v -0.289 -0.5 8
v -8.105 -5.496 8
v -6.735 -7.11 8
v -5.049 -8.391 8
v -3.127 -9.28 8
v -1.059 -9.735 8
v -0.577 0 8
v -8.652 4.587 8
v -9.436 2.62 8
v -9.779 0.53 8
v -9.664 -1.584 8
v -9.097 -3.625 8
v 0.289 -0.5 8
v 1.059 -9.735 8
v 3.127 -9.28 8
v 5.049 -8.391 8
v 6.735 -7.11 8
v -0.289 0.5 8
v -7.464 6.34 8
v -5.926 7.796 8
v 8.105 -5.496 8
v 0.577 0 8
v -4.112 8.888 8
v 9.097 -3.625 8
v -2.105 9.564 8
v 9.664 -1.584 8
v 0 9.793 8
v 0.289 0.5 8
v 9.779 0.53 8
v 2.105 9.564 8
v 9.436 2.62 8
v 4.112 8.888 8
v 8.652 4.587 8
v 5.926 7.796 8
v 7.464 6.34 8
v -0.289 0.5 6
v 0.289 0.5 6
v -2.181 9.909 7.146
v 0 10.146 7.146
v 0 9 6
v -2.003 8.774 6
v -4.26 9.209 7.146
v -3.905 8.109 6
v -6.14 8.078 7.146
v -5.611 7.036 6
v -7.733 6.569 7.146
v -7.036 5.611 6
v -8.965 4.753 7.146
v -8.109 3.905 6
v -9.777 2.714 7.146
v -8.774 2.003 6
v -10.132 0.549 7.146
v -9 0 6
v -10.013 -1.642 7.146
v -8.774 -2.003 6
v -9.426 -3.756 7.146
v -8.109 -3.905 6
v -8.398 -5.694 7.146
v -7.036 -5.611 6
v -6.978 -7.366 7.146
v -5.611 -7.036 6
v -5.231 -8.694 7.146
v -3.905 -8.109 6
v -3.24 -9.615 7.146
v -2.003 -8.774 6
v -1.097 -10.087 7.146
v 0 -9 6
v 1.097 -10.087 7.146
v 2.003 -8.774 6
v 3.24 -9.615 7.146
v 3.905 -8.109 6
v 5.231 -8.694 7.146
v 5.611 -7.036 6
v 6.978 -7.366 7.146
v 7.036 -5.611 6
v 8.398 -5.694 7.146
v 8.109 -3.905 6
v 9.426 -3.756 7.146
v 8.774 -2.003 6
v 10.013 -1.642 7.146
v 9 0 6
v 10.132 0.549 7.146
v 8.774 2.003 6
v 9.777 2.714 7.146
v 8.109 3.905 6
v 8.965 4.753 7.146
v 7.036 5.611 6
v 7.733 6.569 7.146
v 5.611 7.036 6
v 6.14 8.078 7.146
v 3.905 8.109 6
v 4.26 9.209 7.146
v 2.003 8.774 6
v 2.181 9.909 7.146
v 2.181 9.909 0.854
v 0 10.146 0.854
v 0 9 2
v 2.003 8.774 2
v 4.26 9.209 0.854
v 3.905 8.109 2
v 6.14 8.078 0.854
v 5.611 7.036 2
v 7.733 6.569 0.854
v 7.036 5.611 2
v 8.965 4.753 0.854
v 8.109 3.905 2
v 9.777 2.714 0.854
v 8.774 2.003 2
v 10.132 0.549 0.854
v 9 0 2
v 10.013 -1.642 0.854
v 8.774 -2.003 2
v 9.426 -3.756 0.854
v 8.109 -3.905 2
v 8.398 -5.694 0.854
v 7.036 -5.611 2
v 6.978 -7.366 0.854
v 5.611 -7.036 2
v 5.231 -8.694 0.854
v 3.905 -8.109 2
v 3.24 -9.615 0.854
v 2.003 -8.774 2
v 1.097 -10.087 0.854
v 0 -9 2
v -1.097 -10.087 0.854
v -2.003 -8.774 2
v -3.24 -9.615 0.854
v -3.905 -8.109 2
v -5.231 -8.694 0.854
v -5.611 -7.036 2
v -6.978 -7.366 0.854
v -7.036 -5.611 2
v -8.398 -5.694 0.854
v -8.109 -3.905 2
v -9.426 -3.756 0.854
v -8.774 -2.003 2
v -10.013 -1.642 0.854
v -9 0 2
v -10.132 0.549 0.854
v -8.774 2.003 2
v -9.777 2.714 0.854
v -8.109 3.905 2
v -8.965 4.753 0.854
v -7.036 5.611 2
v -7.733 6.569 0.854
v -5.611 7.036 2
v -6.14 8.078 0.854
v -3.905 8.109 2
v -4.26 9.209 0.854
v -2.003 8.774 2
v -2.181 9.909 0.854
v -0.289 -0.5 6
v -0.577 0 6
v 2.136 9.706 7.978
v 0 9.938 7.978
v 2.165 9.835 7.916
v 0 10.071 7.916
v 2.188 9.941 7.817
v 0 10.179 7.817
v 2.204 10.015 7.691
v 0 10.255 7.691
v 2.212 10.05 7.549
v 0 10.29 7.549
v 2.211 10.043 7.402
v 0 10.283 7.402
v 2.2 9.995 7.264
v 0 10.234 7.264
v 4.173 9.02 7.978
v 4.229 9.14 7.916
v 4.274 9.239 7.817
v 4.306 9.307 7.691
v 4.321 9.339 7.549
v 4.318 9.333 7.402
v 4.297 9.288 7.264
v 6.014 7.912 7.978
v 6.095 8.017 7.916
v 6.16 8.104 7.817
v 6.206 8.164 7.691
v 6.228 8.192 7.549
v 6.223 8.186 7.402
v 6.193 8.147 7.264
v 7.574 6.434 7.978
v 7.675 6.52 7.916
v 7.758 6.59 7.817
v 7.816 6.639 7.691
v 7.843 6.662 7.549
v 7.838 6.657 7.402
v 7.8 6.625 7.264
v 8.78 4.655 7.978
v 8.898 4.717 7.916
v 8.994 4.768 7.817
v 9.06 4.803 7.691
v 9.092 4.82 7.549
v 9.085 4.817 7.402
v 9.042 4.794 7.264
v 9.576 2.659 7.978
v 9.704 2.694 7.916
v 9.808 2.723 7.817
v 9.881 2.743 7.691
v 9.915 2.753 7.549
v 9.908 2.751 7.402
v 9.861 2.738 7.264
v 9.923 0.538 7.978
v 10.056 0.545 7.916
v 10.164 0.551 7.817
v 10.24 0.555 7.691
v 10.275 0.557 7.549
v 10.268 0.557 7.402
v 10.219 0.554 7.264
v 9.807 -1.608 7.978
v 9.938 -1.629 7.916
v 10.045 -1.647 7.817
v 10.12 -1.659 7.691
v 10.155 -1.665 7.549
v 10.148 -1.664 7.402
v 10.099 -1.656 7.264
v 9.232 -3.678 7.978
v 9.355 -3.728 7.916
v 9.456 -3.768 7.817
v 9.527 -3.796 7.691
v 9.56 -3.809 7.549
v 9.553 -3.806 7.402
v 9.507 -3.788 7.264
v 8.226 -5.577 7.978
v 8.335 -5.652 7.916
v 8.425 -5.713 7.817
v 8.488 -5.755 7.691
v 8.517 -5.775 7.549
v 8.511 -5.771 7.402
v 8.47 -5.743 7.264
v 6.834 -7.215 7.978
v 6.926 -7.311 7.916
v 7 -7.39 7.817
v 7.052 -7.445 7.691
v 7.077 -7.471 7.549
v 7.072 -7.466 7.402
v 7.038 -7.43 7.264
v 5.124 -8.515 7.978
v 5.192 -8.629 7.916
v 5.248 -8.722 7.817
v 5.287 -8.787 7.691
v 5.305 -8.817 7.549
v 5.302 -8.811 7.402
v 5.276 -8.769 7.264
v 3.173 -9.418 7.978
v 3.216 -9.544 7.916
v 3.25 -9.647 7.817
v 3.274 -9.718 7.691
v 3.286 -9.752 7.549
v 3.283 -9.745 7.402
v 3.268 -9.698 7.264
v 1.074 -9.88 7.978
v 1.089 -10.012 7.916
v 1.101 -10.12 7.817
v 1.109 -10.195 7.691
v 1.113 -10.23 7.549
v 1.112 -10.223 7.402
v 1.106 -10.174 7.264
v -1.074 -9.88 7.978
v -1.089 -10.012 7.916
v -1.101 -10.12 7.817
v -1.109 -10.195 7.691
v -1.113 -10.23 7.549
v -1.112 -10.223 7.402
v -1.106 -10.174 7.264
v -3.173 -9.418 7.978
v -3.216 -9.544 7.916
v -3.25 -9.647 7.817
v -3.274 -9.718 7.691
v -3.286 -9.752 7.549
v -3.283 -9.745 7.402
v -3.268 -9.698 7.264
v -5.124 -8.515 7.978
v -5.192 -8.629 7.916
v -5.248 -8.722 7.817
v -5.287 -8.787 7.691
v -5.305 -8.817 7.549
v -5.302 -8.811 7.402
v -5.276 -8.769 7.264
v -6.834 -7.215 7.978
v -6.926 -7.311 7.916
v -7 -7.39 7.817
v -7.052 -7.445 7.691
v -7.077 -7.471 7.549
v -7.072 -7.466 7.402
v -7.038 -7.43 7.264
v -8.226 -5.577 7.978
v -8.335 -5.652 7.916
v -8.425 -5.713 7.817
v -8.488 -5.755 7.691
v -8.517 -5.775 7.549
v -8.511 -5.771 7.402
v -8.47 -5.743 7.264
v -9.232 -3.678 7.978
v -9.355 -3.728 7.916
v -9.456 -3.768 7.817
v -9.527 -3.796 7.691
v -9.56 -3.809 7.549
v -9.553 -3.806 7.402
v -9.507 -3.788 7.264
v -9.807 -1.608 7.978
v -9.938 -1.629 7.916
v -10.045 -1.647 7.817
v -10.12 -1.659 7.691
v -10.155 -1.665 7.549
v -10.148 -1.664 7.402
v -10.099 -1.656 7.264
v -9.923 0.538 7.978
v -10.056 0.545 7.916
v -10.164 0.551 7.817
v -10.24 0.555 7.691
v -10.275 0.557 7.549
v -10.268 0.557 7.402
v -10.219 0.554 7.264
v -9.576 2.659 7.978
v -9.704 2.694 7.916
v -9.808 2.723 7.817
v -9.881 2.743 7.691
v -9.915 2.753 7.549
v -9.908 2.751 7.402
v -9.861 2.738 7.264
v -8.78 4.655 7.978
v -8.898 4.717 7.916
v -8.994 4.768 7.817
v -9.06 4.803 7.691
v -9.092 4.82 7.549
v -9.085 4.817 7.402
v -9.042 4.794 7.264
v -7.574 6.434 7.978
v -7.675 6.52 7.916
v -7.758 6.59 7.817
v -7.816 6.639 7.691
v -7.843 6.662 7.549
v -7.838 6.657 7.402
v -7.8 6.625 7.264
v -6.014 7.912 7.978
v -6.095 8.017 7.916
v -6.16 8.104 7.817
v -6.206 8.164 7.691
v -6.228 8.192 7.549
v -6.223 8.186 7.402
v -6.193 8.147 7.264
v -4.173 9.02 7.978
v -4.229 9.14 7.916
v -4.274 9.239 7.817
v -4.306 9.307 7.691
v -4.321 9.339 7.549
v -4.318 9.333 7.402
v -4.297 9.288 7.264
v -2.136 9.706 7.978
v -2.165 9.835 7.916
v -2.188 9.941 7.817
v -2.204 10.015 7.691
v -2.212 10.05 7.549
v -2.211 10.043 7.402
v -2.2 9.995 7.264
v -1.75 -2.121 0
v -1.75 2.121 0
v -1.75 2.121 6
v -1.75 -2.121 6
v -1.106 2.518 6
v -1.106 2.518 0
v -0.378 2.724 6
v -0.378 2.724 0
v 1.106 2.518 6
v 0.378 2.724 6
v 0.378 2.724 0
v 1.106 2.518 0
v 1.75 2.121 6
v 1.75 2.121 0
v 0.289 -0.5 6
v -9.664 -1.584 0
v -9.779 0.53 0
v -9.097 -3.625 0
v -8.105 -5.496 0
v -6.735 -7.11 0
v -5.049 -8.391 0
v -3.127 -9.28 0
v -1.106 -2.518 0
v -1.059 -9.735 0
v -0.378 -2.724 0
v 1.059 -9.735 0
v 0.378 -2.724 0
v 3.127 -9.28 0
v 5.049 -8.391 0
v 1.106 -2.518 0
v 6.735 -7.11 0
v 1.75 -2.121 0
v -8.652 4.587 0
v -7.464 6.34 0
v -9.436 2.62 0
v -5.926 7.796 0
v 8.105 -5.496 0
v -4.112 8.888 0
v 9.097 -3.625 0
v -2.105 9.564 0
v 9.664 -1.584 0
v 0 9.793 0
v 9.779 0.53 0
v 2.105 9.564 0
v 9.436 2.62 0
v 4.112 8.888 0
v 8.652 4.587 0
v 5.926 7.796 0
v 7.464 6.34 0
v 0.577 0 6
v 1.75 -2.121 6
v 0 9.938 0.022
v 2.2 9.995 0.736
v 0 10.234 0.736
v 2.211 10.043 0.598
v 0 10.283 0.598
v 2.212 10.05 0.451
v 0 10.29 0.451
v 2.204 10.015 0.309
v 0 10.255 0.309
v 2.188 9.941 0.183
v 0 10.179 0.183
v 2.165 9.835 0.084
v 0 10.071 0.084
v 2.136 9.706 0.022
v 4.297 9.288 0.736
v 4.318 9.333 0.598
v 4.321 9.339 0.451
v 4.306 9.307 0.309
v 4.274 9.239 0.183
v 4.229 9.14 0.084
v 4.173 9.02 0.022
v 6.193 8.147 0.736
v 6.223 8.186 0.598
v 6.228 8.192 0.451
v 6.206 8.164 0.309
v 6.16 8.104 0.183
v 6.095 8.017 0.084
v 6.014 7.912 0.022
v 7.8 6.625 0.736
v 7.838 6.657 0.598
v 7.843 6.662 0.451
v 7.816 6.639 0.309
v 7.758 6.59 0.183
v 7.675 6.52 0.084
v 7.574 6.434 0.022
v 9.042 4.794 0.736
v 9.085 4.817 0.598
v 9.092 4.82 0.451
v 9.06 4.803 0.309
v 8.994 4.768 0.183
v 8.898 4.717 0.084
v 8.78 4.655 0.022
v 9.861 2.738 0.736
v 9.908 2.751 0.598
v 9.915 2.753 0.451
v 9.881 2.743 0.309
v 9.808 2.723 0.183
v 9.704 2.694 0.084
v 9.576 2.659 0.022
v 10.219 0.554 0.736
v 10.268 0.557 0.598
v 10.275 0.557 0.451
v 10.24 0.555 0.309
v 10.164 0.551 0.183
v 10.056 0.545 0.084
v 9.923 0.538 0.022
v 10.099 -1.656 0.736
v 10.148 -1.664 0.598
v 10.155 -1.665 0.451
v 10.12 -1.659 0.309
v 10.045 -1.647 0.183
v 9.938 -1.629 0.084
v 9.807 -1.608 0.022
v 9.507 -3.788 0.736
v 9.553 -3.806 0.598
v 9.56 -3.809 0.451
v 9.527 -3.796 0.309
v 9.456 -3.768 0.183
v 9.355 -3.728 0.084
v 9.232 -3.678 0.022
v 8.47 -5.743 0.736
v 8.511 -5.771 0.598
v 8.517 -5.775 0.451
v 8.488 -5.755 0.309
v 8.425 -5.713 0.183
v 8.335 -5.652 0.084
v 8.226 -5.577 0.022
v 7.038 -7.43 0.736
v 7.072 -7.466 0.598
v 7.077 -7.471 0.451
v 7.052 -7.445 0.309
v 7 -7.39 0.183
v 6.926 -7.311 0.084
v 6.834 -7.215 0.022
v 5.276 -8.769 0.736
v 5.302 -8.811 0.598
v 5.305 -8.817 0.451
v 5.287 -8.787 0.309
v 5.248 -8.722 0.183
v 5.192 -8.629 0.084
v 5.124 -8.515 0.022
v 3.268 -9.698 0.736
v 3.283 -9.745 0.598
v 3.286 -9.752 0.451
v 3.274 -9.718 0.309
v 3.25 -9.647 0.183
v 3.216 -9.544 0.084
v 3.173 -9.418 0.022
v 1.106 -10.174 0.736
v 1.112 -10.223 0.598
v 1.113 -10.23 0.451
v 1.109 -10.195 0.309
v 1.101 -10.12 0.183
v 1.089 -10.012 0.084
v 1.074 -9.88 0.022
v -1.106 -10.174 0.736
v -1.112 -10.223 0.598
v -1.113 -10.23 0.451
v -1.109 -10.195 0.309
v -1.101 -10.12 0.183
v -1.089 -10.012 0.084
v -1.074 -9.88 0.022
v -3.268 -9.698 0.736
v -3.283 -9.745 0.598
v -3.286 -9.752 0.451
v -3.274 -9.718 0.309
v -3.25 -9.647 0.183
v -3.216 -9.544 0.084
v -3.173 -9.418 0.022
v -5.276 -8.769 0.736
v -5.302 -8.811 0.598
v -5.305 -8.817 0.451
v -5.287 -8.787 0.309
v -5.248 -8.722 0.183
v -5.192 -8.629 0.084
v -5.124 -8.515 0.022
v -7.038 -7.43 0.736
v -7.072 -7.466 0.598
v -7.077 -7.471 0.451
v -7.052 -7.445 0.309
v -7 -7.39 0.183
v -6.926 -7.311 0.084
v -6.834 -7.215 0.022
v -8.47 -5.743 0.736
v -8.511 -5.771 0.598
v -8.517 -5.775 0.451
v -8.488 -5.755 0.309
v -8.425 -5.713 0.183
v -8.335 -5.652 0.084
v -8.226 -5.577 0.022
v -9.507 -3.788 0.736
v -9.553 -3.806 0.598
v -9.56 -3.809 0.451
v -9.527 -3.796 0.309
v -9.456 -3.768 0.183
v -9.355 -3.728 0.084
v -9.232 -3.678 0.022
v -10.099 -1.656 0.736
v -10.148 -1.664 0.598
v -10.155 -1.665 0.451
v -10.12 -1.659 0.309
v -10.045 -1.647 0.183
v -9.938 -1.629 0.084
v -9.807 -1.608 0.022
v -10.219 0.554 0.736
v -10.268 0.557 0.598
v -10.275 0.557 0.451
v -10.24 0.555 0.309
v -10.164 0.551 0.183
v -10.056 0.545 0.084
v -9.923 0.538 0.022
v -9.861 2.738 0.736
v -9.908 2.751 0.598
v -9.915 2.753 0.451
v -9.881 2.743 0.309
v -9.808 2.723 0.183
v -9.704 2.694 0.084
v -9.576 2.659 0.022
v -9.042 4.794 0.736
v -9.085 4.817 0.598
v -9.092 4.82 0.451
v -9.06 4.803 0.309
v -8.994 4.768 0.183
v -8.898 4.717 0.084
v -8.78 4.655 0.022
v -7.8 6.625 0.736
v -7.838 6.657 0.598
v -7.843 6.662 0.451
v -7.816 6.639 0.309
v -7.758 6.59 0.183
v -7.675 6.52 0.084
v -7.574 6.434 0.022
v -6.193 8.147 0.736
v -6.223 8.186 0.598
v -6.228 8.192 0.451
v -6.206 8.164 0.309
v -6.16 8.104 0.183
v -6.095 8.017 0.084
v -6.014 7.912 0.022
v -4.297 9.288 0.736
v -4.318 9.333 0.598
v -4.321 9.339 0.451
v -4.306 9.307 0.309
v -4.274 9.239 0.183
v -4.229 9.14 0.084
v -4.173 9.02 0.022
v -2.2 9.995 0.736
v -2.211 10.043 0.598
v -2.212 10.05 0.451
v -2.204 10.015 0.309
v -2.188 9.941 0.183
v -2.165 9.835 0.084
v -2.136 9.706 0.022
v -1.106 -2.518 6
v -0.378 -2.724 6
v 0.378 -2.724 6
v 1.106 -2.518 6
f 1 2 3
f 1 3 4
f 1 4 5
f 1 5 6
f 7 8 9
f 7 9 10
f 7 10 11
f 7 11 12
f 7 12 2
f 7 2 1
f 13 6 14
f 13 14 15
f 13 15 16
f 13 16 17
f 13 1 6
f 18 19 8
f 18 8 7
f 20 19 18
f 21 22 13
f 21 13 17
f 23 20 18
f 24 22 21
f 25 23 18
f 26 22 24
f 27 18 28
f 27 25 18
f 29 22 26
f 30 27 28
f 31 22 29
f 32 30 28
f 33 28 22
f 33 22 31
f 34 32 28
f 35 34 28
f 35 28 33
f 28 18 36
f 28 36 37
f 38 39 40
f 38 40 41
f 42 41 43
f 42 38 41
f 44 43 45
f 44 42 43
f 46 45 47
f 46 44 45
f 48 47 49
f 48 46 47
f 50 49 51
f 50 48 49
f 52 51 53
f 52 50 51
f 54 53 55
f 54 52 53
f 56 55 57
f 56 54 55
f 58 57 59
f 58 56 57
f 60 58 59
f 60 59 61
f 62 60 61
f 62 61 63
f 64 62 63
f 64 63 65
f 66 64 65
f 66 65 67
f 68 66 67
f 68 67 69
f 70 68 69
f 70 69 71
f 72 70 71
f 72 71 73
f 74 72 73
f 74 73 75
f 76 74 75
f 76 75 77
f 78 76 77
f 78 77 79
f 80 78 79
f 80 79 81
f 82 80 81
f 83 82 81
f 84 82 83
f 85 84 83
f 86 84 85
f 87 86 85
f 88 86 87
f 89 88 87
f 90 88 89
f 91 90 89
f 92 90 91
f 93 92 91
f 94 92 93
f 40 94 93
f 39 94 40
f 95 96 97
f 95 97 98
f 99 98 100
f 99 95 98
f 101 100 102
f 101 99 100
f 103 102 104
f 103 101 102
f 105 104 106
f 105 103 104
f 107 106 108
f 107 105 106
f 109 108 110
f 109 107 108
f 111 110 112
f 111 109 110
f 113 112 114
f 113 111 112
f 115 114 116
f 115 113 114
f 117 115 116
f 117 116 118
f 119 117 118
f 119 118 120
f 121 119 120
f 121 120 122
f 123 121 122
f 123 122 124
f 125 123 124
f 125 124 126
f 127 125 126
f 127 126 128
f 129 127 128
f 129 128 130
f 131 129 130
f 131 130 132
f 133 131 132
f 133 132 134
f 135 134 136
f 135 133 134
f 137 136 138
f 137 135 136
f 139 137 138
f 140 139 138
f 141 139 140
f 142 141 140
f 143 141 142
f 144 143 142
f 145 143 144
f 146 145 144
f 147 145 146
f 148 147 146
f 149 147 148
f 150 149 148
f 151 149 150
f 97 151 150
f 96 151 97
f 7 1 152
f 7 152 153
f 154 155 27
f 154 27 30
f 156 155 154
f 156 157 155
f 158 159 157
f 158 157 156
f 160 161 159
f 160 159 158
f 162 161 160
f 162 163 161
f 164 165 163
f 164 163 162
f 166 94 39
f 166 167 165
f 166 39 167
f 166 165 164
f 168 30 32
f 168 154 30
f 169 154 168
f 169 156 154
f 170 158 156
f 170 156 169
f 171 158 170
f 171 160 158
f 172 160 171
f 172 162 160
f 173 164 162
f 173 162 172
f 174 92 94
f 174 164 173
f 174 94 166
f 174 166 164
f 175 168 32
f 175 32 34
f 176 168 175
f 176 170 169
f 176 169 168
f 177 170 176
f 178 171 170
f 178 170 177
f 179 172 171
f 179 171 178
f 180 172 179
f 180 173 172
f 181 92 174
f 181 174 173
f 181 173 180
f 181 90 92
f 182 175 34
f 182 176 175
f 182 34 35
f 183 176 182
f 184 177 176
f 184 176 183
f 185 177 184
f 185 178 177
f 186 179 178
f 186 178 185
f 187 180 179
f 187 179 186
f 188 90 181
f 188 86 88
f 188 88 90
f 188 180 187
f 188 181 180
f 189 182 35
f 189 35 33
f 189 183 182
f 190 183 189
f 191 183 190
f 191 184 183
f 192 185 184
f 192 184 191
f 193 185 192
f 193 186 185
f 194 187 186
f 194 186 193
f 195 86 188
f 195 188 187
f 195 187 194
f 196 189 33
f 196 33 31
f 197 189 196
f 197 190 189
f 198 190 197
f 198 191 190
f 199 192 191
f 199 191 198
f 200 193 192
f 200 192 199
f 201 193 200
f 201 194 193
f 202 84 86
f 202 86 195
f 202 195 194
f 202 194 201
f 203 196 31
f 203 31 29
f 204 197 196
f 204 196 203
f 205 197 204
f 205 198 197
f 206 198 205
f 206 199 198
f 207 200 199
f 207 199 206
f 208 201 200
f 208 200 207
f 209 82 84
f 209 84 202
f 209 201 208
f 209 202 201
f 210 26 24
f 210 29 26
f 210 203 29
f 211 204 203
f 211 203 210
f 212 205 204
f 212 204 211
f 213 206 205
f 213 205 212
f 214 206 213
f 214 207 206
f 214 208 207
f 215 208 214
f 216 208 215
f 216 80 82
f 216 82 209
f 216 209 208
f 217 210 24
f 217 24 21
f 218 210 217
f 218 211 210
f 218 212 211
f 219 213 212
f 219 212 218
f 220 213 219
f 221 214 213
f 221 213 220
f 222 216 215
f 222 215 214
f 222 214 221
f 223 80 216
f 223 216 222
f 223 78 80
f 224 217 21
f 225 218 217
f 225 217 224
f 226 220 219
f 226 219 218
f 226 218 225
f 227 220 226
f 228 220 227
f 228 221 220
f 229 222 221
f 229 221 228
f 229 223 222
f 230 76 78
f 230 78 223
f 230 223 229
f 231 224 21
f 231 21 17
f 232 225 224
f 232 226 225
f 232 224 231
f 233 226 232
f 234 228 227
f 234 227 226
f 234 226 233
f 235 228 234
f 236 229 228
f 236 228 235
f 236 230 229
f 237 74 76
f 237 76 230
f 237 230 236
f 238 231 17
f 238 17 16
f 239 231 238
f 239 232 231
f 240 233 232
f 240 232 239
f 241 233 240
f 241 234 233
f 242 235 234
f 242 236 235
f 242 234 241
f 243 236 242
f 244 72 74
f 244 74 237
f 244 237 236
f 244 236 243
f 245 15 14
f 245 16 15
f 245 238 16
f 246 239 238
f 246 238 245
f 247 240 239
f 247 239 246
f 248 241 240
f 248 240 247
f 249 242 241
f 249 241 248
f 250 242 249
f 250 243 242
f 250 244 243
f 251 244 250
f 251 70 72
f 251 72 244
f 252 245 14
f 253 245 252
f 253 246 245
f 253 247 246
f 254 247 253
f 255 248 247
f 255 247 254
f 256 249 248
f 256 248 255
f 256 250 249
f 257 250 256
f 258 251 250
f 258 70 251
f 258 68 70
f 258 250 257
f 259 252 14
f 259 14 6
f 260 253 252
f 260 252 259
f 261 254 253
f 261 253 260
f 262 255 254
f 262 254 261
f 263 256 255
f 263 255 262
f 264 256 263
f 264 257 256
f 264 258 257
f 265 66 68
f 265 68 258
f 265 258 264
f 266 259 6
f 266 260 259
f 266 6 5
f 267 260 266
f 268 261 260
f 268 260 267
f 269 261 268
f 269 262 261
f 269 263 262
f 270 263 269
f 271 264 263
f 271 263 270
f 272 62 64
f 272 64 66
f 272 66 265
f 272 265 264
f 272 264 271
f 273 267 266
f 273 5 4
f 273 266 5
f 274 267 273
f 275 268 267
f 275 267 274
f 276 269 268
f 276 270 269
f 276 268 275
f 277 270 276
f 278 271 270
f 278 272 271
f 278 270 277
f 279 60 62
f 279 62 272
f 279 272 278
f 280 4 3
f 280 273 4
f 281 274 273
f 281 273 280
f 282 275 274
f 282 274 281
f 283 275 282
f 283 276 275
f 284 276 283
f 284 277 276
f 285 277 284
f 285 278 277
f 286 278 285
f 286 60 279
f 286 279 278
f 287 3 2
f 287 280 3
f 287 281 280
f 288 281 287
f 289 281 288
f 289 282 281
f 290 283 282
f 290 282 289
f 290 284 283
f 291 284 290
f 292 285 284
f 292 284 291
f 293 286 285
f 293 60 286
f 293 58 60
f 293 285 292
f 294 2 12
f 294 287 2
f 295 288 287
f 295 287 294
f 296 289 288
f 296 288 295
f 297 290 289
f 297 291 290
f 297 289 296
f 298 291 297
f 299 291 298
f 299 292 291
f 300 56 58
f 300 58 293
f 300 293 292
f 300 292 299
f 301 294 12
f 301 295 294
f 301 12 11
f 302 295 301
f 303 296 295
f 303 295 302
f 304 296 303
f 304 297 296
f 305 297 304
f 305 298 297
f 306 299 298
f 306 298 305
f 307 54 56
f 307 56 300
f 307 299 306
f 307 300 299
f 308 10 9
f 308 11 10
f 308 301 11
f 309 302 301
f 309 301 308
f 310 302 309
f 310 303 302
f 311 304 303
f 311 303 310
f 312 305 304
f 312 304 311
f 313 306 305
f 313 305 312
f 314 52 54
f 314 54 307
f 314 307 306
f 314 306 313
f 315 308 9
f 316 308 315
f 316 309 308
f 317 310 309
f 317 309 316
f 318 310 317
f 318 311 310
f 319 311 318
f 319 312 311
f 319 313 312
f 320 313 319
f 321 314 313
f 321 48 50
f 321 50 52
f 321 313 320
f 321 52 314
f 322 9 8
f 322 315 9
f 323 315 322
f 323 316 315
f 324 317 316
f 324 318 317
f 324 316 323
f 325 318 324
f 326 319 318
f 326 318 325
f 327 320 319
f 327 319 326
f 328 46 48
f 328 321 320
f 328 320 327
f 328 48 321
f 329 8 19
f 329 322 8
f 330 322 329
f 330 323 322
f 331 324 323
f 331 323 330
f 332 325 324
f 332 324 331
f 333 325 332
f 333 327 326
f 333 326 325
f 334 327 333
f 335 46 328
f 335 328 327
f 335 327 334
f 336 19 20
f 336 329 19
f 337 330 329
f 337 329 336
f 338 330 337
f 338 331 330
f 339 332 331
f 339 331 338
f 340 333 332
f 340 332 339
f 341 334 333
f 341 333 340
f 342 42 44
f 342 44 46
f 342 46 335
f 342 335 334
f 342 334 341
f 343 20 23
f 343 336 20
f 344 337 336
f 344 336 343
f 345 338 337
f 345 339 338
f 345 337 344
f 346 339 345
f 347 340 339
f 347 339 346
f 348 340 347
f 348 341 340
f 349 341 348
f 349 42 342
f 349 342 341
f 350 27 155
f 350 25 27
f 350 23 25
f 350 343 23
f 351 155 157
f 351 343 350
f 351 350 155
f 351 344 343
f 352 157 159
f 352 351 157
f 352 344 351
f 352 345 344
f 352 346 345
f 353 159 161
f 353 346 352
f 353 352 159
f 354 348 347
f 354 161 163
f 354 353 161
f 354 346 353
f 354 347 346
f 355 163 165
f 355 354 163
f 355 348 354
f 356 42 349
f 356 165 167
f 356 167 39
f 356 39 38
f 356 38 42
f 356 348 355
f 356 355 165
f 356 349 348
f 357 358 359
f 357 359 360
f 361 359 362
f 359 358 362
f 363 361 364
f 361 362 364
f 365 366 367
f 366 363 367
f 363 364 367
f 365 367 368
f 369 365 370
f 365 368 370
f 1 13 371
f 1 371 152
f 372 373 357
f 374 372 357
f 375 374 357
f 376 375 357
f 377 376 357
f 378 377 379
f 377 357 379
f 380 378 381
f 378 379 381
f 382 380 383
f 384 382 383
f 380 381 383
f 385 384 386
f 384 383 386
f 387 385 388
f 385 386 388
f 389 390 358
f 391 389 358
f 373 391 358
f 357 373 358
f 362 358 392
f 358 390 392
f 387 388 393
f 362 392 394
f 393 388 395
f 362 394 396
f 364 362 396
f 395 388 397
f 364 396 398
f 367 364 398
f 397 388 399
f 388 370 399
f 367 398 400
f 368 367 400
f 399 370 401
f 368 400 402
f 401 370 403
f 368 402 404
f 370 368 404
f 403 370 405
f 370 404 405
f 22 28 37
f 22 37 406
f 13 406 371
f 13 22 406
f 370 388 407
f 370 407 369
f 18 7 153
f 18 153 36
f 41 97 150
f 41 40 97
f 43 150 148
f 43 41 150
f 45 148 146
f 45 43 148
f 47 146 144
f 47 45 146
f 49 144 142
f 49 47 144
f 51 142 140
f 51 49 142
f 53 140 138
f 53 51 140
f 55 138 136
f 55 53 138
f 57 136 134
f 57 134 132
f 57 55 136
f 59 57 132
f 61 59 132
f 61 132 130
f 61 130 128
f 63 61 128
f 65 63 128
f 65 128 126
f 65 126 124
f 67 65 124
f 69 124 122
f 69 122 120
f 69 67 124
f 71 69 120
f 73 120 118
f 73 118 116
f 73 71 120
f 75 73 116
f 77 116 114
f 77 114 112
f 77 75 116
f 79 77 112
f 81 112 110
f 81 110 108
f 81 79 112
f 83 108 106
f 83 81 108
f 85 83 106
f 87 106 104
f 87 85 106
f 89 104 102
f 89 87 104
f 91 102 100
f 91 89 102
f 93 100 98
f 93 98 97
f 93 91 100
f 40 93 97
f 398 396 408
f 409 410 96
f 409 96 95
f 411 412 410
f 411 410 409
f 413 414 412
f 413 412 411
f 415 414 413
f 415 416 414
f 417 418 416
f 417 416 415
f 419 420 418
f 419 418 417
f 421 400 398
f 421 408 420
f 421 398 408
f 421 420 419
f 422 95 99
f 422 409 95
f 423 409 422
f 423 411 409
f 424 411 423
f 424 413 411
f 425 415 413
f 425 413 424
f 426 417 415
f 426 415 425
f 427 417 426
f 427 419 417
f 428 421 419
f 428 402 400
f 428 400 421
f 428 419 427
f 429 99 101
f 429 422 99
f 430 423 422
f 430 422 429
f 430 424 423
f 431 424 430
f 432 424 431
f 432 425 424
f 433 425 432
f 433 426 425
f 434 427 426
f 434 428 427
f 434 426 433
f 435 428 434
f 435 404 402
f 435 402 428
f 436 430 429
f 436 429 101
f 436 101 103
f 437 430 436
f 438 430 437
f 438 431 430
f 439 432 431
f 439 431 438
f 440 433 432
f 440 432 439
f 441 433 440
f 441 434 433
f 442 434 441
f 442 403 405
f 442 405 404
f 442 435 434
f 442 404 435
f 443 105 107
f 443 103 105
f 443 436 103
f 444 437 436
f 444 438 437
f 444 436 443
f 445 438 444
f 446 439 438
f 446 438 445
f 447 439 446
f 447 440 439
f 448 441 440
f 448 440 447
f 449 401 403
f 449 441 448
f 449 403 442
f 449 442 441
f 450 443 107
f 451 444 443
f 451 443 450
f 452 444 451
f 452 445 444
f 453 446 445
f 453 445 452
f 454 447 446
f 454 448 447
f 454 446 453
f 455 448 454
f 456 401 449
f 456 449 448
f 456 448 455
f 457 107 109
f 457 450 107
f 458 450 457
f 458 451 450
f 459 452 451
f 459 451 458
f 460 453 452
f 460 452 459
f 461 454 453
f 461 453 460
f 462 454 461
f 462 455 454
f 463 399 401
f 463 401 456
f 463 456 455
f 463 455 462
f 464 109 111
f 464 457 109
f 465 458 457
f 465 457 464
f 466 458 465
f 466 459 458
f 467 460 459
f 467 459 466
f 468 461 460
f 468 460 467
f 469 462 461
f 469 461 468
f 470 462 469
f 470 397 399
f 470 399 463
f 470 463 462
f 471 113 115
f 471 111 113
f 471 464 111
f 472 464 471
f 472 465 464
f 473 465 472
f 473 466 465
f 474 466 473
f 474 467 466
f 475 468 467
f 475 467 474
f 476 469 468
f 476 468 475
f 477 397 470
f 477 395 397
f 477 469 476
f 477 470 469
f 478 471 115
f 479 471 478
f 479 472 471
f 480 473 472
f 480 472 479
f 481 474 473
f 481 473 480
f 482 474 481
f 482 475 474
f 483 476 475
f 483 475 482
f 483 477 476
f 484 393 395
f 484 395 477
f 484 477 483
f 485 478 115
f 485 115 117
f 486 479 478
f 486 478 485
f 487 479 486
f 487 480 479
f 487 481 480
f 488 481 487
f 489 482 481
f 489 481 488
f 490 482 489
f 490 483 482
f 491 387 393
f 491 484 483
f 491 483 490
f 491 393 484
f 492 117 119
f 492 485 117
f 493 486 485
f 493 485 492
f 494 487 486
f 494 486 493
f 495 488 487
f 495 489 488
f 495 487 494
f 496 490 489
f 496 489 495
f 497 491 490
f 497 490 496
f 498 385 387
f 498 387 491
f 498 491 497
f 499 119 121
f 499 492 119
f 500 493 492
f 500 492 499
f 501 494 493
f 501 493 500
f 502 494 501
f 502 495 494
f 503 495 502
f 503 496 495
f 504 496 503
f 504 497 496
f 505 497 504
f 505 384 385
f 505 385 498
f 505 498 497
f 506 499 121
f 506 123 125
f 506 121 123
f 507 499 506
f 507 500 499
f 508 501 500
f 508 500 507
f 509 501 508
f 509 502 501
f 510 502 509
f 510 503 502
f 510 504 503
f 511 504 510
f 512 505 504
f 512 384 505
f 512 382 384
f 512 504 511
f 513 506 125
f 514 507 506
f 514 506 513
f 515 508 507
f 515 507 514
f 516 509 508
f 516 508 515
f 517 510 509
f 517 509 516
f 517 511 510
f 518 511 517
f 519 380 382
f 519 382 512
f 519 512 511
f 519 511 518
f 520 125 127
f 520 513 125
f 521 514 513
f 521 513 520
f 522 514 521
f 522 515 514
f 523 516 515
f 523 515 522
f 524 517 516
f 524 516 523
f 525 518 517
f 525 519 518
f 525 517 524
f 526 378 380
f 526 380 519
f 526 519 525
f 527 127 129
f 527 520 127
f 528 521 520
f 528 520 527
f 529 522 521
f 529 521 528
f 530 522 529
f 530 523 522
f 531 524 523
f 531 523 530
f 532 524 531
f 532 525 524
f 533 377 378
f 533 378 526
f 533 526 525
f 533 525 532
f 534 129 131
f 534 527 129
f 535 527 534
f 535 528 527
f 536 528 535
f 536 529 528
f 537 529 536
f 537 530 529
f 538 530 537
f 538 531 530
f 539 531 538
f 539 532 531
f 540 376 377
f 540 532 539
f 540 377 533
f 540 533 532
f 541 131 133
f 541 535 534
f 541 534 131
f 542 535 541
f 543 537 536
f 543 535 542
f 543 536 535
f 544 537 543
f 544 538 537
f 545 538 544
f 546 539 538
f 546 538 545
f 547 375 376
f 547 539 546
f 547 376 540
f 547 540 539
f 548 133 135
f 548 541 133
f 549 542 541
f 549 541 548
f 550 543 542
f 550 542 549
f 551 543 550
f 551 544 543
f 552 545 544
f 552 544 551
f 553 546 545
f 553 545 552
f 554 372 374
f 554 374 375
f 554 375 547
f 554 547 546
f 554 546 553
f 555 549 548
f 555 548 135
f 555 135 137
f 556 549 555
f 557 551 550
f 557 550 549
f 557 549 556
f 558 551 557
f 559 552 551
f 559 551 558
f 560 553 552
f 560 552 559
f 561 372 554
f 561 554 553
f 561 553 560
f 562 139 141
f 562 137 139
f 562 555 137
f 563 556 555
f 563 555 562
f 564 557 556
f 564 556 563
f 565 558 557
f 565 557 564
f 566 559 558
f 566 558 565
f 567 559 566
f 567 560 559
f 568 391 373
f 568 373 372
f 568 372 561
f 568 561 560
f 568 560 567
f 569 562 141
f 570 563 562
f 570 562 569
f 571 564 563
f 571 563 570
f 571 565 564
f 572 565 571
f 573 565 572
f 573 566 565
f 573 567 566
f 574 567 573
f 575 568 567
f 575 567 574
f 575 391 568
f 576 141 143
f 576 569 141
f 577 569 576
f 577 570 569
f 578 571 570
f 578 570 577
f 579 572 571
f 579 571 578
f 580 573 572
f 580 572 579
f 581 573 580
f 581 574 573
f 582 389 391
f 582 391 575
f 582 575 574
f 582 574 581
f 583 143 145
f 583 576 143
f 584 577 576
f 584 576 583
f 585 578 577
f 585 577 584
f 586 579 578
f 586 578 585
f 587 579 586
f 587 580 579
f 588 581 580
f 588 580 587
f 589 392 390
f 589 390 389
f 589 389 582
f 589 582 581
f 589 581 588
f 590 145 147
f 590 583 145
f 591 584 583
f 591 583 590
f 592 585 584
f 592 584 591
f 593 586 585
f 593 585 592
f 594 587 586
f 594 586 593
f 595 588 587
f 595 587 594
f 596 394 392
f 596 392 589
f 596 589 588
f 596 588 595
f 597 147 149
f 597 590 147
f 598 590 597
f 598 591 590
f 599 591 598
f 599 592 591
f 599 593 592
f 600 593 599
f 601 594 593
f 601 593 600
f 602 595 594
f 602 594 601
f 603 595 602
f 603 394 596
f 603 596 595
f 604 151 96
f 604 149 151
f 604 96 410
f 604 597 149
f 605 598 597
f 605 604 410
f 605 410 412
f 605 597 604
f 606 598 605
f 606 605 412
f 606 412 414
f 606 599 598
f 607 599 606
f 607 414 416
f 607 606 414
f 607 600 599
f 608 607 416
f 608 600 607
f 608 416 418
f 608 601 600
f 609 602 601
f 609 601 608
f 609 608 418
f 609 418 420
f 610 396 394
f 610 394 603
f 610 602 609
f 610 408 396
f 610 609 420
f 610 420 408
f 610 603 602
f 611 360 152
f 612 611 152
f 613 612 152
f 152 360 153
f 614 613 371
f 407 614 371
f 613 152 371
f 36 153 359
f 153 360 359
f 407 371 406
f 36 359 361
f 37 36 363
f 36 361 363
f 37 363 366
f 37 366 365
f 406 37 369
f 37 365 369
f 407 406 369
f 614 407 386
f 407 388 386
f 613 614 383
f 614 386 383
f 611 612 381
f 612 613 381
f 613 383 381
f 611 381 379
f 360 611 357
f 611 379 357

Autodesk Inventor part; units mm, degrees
ref_plane "YZ Plane" through (0, 0, 0) normal (1, 0, 0) x (0, 1, 0)
ref_plane "XZ Plane" through (0, 0, 0) normal (0, 1, 0) x (-1, 0, 0)
ref_plane "XY Plane" through (0, 0, 0) normal (0, 0, 1) x (1, 0, 0)
sketch "Sketch1" plane through (0, 0, 0) normal (0, 0, 1) x (1, 0, 0)
  line L0 (1.5, -2) -> (1.5, 2)
  line L1 (-1.5, 2) -> (-1.5, -2)
  arc A0 (-1.5, -2) -> (1.5, -2) centre (0, 0) ccw
  arc A1 (1.5, 2) -> (-1.5, 2) centre (0, 0) ccw
  line L2 (-1.75, 2.1213) -> (-1.75, -2.1213)
  arc A2 (-1.75, -2.1213) -> (1.75, -2.1213) centre (0, 0) ccw
  line L3 (1.75, -2.1213) -> (1.75, 2.1213)
  arc A3 (1.75, 2.1213) -> (-1.75, 2.1213) centre (0, 0) ccw
  circle A4 centre (0, 0) radius 11
  dimension "d0" = 3
  dimension "d2" = 2.5
  dimension "d3" = 0.25
  dimension "d4" = 22
extrude "Extrusion1" add sketch "Sketch1" along normal blind 6 contours A4
sketch "Sketch2" plane through (0, 0, 6) normal (0, 0, 1) x (1, 0, 0)
  circle A0 centre (0, 0) radius 11 projected
extrude "Extrusion2" add sketch "Sketch2" along normal blind 2
sketch "Sketch3" plane through (0, 0, 8) normal (0, 0, 1) x (1, 0, 0)
  line L0 (0.5774, 0) -> (0.2887, -0.5)
  line L1 (0.2887, -0.5) -> (-0.2887, -0.5)
  line L2 (-0.2887, -0.5) -> (-0.5774, 0)
  line L3 (-0.5774, 0) -> (-0.2887, 0.5)
  line L4 (-0.2887, 0.5) -> (0.2887, 0.5)
  line L5 (0.2887, 0.5) -> (0.5774, 0)
  point P0 (0, 0)
  point P1 (0, 0)
  dimension "d24" = 1
sketch "Sketch4" plane through (0, 0, 0) normal (1, 0, 0) x (0, 1, 0)
  line L0 (11, 8) -> (-11, 8) projected
  line L1 (-11, 0) -> (11, 0) projected
  line L2 (11, 8) -> (11, 0)
  line L3 (11, 0) -> (9, 2)
  line L4 (9, 2) -> (9, 6)
  line L5 (9, 6) -> (11, 8)
  line L6 (0, -1.6) -> (0, 9.6) projected
  point P0 (0, 0)
  dimension "d16" = 45
  dimension "d17" = 45
  dimension "d18" = 4
revolve "Revolution1" cut sketch "Sketch4" angle 360 about axis through (0, 0, -10) along (0, 0, 1) contours L2 L3 L4 L5
fillet "Fillet1" radius 0.5 2 edges at (0, -11, 0) (0, -11, 8)
extrude "Extrusion3" cut sketch "Sketch3" against normal through all
properties part number "22mm Spool" material "ABS Plastic"
